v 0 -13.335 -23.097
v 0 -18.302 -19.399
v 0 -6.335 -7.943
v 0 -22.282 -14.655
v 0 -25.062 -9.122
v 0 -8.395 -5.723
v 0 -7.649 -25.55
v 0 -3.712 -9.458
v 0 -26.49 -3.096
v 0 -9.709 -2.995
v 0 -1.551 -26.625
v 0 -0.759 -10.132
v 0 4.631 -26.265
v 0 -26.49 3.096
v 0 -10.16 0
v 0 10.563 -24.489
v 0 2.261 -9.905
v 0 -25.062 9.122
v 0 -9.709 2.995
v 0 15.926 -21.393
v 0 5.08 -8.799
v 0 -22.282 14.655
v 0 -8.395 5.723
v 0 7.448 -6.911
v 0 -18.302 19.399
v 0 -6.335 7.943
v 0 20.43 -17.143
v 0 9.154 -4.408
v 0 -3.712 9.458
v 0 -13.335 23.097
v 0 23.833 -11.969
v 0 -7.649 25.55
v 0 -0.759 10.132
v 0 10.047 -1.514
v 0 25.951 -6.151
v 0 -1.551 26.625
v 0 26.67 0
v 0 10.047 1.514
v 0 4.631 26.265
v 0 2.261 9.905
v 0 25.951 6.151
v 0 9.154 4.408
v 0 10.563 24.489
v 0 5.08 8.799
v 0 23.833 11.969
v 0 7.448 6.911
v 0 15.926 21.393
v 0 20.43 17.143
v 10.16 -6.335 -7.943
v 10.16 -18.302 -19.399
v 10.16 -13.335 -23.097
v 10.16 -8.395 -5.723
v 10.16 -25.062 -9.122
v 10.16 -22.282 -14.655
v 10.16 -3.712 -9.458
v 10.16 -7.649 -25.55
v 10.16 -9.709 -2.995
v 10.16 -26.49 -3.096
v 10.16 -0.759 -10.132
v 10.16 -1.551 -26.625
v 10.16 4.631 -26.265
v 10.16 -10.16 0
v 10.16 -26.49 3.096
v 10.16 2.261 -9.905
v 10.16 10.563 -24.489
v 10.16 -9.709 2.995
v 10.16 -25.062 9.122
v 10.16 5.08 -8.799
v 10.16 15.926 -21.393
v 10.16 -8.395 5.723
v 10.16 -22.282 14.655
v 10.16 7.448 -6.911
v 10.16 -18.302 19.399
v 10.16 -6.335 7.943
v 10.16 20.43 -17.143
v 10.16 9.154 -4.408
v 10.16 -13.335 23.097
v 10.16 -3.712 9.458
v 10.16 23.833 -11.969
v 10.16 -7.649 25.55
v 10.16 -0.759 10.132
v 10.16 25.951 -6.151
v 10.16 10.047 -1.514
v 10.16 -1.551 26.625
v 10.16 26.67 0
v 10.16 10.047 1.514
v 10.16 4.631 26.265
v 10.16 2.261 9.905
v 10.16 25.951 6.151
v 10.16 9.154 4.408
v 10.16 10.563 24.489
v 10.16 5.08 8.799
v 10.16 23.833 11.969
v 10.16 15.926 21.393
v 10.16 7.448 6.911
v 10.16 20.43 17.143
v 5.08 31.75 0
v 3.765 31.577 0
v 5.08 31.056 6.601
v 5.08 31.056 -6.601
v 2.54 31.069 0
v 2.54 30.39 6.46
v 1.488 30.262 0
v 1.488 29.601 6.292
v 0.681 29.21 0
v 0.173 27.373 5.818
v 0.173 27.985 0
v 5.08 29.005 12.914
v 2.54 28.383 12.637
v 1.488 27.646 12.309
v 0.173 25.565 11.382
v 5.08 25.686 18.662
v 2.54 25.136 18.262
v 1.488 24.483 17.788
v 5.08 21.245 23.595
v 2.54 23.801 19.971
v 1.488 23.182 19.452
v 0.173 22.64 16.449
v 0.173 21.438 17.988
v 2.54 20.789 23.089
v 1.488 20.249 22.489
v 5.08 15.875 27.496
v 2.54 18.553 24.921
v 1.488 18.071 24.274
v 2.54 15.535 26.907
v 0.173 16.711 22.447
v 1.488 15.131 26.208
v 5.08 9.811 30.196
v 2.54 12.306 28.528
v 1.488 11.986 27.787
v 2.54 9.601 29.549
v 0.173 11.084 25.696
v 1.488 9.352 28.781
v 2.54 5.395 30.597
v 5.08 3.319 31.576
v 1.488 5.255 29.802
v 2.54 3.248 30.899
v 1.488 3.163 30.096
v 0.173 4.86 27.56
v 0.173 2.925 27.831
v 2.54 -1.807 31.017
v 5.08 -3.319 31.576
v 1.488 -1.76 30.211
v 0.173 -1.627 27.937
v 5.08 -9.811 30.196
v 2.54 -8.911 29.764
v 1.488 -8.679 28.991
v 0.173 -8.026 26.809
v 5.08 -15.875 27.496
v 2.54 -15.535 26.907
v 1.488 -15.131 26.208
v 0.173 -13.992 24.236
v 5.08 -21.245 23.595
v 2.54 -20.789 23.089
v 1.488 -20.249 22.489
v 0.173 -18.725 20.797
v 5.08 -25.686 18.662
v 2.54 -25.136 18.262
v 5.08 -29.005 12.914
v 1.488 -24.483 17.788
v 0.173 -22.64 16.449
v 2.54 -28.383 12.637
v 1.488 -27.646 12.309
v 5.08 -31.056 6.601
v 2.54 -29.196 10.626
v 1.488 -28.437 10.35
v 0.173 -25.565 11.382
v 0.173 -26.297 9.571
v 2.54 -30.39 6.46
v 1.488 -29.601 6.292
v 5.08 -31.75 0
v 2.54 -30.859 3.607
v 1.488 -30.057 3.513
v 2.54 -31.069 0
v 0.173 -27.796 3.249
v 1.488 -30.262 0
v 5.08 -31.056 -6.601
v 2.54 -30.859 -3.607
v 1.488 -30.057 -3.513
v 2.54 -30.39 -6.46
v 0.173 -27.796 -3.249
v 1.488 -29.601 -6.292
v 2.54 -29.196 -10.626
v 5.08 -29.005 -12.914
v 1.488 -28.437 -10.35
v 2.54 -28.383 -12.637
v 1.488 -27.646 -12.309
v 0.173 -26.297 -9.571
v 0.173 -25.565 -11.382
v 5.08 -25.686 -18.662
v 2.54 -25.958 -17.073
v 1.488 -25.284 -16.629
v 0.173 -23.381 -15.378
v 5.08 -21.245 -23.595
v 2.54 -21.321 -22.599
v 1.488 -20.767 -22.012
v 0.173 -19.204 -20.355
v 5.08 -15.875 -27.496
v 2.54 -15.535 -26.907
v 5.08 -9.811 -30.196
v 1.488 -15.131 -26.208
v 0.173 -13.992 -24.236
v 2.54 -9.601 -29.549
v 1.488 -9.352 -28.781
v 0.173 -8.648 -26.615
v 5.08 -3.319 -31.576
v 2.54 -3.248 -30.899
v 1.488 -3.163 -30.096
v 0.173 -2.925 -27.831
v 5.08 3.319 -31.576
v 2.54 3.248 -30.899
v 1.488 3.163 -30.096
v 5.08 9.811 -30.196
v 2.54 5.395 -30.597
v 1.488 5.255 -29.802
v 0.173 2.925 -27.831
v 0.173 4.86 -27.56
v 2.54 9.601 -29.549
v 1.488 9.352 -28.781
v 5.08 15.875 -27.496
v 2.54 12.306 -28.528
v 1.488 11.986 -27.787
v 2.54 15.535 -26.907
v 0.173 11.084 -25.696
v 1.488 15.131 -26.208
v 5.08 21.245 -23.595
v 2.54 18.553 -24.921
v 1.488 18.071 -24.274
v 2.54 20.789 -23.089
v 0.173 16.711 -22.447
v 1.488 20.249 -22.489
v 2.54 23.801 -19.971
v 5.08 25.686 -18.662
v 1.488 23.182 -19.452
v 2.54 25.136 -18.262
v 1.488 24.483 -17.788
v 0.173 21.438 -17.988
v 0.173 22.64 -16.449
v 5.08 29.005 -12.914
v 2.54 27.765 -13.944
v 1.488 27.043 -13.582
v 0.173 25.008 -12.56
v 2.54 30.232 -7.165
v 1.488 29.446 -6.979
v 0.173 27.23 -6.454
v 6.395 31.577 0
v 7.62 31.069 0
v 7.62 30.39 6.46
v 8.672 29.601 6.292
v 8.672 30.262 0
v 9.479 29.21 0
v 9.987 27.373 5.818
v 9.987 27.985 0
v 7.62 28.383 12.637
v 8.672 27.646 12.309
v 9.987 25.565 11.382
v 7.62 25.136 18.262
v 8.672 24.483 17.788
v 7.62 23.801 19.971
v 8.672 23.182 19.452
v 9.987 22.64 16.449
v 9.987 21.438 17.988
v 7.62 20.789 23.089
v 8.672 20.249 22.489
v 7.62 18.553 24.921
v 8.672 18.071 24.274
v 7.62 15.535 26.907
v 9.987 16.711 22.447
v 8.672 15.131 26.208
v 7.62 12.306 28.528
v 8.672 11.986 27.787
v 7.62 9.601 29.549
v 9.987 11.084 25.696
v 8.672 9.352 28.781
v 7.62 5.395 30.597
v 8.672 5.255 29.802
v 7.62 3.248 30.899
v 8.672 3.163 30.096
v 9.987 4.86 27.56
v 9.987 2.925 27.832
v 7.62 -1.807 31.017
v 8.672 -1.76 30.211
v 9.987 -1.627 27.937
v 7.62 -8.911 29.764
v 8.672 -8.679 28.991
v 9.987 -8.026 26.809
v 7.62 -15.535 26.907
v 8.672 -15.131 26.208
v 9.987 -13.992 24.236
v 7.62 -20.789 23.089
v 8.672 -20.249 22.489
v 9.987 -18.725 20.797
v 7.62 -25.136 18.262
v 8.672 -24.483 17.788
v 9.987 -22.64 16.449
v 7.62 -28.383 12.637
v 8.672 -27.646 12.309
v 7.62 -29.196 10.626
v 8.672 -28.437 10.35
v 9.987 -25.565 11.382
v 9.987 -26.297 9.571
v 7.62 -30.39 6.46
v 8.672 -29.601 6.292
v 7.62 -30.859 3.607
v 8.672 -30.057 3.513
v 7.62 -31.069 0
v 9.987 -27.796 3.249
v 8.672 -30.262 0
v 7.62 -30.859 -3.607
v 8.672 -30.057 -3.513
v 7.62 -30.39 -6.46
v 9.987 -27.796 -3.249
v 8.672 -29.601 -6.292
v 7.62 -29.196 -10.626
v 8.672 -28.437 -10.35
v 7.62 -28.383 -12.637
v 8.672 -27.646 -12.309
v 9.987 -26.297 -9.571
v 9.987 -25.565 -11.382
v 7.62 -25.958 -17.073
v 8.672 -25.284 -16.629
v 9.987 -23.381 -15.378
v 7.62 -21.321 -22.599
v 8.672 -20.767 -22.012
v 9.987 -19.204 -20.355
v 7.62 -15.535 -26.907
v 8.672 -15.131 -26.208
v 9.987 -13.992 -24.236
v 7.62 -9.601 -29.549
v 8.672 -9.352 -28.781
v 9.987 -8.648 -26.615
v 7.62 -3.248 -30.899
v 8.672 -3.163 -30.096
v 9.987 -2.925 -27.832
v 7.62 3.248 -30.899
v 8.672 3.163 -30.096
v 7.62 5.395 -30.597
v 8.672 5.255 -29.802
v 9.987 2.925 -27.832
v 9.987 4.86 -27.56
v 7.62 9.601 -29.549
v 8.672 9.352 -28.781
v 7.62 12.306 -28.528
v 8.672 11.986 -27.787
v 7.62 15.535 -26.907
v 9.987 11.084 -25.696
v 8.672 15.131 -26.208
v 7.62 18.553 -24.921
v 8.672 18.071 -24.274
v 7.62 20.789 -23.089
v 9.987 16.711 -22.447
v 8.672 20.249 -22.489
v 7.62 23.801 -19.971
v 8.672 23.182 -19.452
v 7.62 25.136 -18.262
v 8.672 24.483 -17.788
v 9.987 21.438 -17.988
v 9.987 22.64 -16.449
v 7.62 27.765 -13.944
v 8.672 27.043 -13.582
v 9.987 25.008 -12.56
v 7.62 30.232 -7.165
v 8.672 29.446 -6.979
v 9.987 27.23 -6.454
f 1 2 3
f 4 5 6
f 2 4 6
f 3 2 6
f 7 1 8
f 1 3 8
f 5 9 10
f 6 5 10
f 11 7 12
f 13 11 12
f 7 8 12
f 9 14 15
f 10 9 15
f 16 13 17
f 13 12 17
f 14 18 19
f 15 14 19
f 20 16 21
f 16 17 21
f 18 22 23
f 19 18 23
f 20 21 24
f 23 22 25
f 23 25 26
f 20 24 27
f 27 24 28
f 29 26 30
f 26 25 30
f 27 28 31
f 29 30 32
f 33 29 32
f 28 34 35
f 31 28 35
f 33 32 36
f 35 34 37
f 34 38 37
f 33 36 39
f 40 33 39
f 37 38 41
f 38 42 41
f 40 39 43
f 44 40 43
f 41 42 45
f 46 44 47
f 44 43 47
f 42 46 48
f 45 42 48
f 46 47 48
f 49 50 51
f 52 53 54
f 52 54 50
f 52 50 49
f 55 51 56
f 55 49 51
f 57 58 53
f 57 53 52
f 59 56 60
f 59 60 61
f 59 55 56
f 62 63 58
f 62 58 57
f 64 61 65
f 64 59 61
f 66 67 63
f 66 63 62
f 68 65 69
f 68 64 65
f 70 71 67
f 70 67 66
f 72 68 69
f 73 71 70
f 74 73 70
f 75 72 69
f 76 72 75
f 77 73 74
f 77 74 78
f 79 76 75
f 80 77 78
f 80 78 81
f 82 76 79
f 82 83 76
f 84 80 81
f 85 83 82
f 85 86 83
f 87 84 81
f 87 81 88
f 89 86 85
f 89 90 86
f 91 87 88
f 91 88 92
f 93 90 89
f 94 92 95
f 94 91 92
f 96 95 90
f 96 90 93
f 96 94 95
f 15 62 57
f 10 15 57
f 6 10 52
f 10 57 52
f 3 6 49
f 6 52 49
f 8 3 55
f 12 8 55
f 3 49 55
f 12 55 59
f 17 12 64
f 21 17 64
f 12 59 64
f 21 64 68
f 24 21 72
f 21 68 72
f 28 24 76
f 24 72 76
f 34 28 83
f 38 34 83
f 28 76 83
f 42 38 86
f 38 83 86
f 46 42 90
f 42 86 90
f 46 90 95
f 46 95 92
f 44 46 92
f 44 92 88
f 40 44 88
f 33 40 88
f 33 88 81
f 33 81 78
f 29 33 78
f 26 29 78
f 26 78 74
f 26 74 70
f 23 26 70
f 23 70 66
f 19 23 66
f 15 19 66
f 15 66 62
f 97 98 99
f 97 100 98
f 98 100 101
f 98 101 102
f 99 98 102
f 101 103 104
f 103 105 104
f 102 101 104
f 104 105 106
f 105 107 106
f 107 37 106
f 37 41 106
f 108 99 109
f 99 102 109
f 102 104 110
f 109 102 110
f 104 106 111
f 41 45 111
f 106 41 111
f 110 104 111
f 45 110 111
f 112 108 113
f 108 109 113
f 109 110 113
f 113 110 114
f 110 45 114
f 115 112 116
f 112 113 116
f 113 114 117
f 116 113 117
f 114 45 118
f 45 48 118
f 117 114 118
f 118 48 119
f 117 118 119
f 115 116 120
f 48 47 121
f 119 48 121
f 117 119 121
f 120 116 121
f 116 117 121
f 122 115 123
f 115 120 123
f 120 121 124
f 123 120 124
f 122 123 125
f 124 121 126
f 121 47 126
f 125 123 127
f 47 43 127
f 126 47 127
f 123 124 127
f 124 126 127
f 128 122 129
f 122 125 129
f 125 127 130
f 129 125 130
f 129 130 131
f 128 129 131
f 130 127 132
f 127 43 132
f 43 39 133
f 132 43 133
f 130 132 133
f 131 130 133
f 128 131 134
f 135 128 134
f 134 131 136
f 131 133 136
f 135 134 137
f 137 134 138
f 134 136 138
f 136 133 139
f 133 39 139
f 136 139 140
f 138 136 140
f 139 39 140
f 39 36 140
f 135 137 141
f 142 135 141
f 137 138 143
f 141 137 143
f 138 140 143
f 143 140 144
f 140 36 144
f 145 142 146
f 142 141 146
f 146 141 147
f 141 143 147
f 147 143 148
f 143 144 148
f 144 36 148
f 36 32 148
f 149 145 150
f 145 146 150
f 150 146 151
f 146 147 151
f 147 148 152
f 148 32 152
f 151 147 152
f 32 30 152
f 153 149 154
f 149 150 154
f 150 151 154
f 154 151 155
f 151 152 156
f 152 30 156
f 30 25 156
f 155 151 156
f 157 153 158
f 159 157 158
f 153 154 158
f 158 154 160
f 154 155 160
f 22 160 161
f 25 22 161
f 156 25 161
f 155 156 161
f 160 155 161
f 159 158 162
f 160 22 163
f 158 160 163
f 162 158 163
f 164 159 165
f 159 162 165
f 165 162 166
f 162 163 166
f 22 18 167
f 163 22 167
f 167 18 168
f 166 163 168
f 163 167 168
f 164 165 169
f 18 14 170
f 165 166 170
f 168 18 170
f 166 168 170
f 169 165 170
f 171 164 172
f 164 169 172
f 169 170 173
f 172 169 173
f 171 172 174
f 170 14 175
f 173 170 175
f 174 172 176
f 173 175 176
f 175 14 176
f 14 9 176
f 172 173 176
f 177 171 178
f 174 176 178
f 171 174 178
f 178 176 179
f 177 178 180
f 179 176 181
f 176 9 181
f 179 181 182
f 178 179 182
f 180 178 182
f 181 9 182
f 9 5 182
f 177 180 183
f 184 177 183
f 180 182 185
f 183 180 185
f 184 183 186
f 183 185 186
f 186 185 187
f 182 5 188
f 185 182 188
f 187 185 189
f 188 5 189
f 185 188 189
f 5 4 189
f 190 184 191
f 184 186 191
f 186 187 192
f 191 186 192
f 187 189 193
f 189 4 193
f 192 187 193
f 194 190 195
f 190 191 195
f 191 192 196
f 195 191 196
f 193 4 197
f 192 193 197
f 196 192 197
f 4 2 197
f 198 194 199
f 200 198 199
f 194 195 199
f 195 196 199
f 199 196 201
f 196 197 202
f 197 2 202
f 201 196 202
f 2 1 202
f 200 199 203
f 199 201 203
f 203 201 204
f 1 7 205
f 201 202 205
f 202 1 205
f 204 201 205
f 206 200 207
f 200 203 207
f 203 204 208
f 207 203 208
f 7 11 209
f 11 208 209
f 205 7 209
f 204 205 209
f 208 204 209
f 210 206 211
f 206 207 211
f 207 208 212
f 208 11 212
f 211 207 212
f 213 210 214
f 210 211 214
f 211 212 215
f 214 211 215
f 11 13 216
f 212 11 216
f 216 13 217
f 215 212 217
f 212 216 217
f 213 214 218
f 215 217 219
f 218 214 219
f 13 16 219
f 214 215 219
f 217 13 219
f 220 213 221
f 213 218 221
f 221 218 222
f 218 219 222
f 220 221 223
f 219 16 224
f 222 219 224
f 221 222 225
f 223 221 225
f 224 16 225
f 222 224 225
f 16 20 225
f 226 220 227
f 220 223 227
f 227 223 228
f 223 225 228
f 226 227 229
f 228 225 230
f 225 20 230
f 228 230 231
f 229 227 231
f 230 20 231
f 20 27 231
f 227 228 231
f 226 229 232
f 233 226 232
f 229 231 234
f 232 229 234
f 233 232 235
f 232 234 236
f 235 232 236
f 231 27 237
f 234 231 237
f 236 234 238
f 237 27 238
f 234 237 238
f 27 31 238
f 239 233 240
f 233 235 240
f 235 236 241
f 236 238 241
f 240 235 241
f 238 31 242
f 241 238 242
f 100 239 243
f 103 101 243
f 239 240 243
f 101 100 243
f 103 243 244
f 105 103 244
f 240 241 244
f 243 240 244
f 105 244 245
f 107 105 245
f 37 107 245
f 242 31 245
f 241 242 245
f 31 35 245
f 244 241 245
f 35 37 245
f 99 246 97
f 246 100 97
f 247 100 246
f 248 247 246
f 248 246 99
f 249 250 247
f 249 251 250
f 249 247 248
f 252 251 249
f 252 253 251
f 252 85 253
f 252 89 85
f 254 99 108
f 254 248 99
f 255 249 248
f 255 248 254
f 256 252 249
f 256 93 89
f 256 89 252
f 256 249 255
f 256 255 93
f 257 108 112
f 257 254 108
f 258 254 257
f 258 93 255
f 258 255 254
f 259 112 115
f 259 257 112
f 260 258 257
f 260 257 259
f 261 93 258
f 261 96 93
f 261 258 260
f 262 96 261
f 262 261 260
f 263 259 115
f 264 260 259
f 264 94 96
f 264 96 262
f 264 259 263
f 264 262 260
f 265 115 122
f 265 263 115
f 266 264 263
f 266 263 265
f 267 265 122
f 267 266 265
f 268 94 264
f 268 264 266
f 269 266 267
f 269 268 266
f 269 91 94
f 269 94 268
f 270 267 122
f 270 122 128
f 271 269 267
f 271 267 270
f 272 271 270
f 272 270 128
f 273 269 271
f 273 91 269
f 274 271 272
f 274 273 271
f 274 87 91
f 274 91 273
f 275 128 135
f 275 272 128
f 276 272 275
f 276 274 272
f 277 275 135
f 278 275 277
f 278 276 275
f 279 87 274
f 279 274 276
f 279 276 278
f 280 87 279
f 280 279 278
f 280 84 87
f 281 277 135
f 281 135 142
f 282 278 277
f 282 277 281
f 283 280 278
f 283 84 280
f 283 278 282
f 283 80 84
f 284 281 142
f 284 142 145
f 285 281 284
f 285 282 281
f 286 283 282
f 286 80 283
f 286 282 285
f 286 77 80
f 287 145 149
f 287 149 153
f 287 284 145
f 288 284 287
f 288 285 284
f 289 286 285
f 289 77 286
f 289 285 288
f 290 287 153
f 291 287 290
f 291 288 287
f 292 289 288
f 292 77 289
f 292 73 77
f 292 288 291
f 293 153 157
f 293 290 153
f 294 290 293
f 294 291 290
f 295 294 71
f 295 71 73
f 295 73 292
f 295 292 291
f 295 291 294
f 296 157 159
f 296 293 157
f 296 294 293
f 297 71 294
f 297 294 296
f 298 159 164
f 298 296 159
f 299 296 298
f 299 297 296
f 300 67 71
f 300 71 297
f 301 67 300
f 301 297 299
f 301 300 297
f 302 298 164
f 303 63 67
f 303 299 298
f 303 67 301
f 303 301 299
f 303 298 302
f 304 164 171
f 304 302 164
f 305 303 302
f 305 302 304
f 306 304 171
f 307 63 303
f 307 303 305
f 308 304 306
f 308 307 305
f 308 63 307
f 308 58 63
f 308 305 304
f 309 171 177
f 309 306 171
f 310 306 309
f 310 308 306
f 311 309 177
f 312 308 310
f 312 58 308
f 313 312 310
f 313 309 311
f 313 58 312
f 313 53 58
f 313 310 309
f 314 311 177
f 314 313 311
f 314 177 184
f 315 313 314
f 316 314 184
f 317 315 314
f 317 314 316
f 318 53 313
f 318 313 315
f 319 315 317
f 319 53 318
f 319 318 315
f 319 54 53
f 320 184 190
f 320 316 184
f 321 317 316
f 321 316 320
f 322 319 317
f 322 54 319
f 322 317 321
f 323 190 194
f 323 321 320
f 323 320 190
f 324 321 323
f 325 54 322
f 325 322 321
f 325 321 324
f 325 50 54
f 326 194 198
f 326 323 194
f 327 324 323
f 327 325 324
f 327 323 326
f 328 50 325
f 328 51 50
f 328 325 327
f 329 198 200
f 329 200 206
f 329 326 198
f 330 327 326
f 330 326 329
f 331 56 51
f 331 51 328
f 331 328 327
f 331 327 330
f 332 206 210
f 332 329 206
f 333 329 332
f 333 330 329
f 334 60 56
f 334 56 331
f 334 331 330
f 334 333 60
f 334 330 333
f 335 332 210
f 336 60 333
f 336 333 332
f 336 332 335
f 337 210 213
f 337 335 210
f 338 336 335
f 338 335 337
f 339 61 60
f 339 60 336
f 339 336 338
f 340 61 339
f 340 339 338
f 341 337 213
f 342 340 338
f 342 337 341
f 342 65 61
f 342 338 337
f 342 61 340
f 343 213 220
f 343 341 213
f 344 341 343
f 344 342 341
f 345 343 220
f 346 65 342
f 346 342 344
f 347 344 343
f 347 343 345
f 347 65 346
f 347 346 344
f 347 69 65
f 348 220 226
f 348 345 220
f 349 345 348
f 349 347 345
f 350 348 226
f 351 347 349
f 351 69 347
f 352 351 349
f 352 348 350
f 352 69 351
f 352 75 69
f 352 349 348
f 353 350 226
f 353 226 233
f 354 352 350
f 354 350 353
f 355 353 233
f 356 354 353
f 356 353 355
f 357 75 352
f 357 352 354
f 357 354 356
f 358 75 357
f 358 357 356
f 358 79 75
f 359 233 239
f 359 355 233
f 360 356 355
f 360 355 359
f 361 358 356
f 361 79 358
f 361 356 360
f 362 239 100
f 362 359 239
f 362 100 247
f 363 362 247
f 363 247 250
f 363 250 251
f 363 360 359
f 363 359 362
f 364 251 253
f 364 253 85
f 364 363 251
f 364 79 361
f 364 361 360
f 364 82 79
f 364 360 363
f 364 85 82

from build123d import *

# Parameters (mm, degrees)
F0_R     = 31.75
F2_DEPTH = 10.16
F3_D     = 20.32
F4_R     = 5.08
F5_R     = 5.07999


# Not quite as in the source:
# - a fillet or chamfer is up to 0.001 mm smaller than in the source, because OpenCascade refuses the exact size


with BuildPart() as f2:
    # F0 (on Right) → F2 (new body)
    with BuildSketch(Plane.YZ):
        Circle(F0_R)
    extrude(amount=F2_DEPTH)

    # F3 (through all)
    with Locations(Plane(origin=(0, 0, 0), x_dir=(0, 1, 0), z_dir=(-1, 0, 0))):
        with Locations((0, 0)):
            Hole(F3_D / 2)

    # F4
    f4_edges = [f2.edges().sort_by_distance(p)[0] for p in [
        (0, -31.75, 0),
    ]]
    fillet(f4_edges, radius=F4_R)

    # F5 (radius 5.08 in the source; OpenCascade refuses exactly that, so slightly less here)
    f5_edges = [f2.edges().sort_by_distance(p)[0] for p in [
        (10.16, -31.75, 0),
    ]]
    fillet(f5_edges, radius=F5_R)


solid = f2.part
